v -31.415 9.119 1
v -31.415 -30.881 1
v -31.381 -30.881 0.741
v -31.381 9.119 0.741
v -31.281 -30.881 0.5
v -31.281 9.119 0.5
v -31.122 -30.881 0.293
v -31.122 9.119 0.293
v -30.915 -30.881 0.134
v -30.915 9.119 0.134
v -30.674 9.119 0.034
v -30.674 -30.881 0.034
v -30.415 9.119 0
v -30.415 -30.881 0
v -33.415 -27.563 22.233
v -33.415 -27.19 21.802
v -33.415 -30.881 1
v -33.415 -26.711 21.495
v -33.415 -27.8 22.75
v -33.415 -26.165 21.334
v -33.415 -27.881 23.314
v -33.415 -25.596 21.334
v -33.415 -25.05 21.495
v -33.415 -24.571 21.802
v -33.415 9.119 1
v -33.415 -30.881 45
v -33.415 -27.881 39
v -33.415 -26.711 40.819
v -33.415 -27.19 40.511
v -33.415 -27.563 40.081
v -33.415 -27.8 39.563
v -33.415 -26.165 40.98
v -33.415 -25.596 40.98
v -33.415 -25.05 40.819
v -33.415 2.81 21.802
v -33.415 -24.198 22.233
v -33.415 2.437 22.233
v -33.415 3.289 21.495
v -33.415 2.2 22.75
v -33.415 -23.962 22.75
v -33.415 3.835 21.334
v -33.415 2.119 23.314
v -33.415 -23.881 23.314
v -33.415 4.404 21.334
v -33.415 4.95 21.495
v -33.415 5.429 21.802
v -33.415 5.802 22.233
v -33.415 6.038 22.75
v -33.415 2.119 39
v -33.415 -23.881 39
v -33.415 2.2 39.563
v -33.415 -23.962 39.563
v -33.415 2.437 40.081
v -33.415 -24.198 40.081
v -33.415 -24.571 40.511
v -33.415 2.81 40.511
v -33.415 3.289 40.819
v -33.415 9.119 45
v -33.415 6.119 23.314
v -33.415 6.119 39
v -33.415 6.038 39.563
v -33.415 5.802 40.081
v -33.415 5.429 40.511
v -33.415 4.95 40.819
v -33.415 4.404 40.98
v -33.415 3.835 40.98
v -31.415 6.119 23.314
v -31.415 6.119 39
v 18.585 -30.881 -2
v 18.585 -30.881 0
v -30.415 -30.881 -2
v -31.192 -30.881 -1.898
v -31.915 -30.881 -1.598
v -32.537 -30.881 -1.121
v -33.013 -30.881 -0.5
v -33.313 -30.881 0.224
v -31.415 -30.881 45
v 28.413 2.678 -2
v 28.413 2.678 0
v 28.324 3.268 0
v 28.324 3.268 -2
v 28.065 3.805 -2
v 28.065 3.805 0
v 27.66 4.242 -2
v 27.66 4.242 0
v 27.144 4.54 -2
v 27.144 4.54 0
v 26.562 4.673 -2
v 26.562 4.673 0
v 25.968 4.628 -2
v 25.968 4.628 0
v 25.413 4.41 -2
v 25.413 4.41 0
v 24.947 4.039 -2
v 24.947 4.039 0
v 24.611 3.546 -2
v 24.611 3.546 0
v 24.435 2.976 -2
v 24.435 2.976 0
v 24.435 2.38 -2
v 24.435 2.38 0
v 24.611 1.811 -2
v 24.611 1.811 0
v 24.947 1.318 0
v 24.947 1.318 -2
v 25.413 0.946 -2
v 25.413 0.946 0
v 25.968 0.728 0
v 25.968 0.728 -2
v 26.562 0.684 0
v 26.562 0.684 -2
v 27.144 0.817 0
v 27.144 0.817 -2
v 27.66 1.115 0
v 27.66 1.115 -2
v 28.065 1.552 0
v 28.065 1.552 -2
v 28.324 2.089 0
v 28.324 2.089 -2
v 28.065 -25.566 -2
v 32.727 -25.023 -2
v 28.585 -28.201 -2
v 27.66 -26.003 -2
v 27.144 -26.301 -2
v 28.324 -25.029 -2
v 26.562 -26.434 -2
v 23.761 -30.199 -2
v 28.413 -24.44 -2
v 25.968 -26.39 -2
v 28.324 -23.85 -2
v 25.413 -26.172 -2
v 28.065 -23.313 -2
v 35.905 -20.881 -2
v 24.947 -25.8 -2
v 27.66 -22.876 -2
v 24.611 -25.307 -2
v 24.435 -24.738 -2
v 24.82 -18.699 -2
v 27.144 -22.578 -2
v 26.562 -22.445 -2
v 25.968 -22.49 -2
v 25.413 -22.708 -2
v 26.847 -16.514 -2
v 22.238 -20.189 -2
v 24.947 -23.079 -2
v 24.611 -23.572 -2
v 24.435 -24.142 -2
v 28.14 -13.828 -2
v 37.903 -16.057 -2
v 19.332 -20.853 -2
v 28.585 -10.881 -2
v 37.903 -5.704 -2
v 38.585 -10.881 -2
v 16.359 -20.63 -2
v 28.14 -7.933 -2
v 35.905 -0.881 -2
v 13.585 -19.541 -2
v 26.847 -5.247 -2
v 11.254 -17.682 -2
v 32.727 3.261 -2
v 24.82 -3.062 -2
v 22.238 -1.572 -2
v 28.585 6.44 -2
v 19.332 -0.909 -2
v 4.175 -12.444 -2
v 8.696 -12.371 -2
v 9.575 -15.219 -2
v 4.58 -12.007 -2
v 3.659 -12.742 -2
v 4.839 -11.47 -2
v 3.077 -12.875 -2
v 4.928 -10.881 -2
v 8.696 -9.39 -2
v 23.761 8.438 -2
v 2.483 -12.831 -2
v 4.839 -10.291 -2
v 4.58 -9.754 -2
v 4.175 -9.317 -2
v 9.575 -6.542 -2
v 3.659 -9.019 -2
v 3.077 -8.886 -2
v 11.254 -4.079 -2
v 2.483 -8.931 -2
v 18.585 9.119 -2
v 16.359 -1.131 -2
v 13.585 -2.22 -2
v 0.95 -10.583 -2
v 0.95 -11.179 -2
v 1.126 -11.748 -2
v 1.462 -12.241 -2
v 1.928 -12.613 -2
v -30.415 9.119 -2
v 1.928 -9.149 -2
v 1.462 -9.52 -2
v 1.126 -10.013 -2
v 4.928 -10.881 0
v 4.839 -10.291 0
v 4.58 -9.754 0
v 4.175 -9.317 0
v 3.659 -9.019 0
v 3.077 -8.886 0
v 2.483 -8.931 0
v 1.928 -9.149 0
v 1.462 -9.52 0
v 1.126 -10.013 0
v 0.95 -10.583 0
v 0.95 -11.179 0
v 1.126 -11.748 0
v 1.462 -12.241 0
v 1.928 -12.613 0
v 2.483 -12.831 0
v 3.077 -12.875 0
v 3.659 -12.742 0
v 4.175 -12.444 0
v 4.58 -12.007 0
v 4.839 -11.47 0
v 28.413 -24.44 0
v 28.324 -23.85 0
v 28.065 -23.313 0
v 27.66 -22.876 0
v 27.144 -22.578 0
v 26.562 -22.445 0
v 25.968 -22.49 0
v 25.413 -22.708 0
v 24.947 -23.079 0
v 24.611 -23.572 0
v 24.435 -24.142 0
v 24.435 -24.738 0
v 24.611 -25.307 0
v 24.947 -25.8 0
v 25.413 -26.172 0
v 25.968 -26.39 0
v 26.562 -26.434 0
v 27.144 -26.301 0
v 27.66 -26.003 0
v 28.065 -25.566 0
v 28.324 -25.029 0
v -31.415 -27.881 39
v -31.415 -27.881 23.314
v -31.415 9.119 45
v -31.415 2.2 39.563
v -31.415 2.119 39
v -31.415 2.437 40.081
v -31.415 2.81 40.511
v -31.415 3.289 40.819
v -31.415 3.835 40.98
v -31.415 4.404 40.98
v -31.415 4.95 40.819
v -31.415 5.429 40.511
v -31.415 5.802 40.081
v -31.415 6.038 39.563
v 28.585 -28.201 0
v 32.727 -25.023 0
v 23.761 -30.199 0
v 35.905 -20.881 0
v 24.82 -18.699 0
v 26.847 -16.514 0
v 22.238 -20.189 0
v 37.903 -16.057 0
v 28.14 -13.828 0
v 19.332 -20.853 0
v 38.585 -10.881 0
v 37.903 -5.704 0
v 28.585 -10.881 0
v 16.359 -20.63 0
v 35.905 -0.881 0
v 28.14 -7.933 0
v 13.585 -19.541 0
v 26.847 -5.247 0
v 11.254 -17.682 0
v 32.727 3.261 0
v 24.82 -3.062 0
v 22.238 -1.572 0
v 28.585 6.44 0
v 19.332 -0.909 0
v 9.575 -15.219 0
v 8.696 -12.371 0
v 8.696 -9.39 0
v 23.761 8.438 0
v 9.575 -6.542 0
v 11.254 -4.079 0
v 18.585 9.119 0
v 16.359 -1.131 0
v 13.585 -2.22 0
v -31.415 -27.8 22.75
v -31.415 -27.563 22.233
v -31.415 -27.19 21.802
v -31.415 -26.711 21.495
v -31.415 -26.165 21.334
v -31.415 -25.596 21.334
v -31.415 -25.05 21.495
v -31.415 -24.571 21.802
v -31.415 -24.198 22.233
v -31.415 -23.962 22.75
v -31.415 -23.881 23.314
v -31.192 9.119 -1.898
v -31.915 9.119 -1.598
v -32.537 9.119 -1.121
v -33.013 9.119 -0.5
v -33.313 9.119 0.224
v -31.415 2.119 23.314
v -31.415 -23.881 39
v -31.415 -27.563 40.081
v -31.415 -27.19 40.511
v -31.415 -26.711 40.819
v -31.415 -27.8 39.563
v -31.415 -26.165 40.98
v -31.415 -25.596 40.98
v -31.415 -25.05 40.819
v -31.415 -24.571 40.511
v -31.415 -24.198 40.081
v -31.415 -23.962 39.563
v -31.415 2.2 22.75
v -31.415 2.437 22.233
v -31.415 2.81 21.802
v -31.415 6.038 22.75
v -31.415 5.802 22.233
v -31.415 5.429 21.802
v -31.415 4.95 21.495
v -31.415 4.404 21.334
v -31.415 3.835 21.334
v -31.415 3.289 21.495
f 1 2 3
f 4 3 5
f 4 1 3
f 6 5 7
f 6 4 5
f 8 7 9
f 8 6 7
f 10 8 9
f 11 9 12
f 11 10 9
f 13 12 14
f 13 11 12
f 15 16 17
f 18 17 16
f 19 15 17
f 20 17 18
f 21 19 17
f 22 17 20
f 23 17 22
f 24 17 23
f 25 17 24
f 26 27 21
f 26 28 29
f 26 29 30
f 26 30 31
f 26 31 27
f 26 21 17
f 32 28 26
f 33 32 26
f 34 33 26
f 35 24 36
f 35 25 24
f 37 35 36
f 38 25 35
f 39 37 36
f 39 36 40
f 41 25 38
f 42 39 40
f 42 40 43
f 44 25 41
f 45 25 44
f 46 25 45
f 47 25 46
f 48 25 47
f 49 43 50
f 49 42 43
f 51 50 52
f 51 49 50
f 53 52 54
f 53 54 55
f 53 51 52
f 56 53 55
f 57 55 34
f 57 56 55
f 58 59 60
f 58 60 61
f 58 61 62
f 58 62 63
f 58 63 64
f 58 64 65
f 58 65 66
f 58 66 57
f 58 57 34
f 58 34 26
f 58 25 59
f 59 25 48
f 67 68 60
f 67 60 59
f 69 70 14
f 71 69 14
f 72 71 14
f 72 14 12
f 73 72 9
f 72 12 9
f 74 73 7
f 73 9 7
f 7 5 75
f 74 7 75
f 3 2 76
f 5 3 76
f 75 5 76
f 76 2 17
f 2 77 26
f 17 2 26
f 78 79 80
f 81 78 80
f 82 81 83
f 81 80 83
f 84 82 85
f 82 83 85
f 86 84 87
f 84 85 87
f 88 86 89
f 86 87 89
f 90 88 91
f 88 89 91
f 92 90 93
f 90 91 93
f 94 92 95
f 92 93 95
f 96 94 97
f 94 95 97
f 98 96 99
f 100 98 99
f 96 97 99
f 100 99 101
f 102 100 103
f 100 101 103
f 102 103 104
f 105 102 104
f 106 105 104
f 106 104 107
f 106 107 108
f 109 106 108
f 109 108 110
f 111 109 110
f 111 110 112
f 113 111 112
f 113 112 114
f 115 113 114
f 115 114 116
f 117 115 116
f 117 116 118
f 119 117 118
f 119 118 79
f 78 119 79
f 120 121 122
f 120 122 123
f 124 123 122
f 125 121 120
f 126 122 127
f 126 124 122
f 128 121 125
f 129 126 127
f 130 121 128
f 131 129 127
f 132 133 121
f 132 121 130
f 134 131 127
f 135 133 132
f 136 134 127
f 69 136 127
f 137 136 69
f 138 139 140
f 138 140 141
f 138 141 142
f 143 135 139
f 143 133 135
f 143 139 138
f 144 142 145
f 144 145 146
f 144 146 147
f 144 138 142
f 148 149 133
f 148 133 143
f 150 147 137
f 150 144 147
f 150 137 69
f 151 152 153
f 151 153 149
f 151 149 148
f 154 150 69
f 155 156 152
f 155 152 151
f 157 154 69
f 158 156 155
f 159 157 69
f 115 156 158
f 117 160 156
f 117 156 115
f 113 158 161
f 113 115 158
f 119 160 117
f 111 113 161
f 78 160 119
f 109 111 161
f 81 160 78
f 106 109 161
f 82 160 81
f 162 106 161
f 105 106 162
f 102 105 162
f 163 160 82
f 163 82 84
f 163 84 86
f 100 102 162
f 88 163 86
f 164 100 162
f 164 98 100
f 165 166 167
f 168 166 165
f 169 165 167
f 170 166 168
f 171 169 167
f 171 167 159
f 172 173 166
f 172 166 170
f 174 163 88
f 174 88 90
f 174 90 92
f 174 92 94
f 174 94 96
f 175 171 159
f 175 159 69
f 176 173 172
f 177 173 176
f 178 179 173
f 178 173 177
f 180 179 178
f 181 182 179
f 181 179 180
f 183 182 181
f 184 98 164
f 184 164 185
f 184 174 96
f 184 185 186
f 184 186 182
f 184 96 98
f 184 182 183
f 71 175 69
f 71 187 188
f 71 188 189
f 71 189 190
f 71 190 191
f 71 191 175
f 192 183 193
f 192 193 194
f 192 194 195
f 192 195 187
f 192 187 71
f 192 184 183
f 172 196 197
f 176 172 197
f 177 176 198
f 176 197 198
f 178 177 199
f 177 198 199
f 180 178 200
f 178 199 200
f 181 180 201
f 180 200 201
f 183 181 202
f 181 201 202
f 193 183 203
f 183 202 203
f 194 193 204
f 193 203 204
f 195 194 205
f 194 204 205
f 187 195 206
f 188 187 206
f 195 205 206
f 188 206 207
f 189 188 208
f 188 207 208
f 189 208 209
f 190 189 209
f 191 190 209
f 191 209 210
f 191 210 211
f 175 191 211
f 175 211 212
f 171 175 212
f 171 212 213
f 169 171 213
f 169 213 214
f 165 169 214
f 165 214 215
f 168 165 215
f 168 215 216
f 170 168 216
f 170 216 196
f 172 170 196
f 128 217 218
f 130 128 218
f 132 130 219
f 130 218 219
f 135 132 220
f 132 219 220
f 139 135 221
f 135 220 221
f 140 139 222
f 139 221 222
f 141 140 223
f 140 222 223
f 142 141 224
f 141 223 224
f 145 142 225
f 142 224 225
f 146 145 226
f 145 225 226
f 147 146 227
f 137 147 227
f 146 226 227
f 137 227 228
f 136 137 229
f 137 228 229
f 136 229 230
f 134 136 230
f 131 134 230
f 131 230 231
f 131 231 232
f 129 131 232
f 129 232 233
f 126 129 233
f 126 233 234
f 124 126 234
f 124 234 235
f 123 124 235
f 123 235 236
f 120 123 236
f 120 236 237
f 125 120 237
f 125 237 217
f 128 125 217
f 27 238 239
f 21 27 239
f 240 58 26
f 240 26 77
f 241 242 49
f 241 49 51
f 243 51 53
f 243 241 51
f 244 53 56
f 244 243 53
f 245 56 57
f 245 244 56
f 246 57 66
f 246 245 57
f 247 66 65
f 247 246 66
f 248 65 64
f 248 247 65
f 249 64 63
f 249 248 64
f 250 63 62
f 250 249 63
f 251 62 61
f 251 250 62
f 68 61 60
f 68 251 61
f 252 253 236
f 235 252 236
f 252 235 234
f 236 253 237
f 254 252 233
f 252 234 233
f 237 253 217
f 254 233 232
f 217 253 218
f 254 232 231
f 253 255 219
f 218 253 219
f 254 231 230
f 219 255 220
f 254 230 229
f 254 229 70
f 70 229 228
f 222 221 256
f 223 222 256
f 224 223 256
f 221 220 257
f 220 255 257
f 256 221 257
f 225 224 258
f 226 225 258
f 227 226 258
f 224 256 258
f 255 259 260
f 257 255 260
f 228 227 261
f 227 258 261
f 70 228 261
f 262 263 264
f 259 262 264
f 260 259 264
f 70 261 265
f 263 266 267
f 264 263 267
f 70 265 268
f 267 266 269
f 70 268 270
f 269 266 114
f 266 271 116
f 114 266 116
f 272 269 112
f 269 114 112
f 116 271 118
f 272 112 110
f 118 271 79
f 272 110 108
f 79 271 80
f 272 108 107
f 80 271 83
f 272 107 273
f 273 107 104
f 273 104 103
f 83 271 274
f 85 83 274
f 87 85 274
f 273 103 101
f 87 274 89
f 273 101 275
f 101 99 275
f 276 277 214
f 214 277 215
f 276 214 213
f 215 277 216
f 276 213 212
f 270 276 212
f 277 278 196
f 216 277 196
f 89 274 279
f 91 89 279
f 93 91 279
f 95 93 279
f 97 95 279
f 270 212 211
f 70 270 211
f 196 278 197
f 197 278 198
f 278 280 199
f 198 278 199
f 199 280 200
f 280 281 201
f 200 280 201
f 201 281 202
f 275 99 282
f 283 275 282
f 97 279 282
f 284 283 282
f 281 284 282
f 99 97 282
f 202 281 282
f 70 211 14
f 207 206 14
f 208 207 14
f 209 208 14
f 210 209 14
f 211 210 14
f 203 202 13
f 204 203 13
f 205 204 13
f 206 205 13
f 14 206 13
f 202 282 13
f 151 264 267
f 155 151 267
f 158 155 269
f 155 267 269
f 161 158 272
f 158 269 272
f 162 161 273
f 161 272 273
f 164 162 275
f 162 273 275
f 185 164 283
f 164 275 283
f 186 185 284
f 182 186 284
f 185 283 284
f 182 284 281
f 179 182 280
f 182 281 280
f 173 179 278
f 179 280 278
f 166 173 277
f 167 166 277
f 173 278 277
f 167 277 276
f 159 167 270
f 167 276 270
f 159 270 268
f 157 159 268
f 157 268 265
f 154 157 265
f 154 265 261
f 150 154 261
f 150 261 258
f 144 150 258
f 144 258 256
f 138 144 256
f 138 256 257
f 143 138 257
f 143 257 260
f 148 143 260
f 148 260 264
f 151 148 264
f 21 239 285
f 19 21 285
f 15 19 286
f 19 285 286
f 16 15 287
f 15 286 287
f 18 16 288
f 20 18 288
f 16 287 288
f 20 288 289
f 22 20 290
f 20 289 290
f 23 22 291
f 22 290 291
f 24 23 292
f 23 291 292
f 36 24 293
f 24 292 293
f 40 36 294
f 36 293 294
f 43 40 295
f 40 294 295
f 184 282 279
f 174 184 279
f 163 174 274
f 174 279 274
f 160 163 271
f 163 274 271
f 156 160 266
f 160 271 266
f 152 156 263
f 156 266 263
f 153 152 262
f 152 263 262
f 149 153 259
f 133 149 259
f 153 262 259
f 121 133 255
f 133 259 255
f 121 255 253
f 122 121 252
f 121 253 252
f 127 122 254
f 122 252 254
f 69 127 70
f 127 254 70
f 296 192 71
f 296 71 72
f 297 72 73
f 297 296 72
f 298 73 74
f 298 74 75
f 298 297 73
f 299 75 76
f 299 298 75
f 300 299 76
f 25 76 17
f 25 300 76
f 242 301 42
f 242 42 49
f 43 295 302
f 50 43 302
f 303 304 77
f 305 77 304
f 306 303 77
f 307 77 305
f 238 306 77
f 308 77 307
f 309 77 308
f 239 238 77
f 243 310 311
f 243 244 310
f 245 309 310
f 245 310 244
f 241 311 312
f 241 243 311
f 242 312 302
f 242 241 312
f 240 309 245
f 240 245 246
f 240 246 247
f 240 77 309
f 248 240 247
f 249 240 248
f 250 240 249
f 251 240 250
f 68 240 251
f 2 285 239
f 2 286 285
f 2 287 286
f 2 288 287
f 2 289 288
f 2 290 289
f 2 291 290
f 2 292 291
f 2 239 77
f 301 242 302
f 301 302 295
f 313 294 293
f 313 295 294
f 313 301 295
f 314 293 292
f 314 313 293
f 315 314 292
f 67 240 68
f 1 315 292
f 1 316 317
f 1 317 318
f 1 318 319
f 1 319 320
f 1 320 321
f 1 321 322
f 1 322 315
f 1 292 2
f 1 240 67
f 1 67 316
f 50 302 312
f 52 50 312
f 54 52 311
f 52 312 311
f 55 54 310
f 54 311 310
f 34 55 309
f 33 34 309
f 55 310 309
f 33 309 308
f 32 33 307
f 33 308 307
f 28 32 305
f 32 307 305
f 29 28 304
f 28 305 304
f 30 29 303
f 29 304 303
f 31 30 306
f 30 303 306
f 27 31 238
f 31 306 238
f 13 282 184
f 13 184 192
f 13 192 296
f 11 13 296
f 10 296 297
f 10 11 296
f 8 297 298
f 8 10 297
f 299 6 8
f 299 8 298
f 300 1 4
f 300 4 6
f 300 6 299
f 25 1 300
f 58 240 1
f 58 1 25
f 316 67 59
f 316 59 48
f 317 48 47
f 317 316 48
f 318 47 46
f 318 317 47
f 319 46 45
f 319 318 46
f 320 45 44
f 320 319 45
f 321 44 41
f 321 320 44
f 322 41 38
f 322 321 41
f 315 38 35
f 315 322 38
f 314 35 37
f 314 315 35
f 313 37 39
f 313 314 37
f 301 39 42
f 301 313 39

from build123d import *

# Parameters (mm, degrees)
SM_BASE_FLANGE_1_DEPTH           = 2
SKETCH_7_R                       = 10
SKETCH_7_R_2                     = 2
CUT_EXTRUDE_1_DEPTH              = 50.460967207
SM_EDGE_FLANGE_1_STRIP_W         = 10
SM_EDGE_FLANGE_1_STRIP_H         = 2
SM_EDGE_FLANGE_1_STRIP_CUT_DEPTH = 40
SM_EDGE_FLANGE_1_DEPTH           = 40
CUT_EXTRUDE_2_DEPTH              = 89.761563758


# Sheet-metal steps are written as plain solids
with BuildPart() as part:
    # Sketch 1 → 基体-法兰1 (new body)
    with BuildSketch(Plane.XY):
        with BuildLine():
            Line((-31.41539068, 9.119339374), (18.58460932, 9.119339374))
            ThreePointArc((18.58460932, 9.119339374), (38.58460932, -10.880660626), (18.58460932, -30.880660626))
            Line((18.58460932, -30.880660626), (-31.41539068, -30.880660626))
            Line((-31.41539068, -30.880660626), (-31.41539068, 9.119339374))
        make_face()
    extrude(amount=-SM_BASE_FLANGE_1_DEPTH)

    # 草图7 → 切除-拉伸1 (cut, through all)
    with BuildSketch(Plane.XY):
        with Locations((18.58460932, -10.880660626)):
            Circle(SKETCH_7_R)
        with Locations((2.928014356, -10.880660626)):
            Circle(SKETCH_7_R_2)
        with Locations((26.412906802, 2.67834835)):
            Circle(SKETCH_7_R_2)
        with Locations((26.412906802, -24.439669602)):
            Circle(SKETCH_7_R_2)
    extrude(amount=-CUT_EXTRUDE_1_DEPTH, mode=Mode.SUBTRACT)

    # 边线-法兰1 strip (across the edge) → 边线-法兰1 strip cut (cut)
    with BuildSketch(Plane(origin=(-31.41539068, 9.119339374, 0), x_dir=(1, 0, 0), z_dir=(0, -1, 0))):
        with Locations((-4, -1)):
            Rectangle(SM_EDGE_FLANGE_1_STRIP_W, SM_EDGE_FLANGE_1_STRIP_H)
    extrude(amount=SM_EDGE_FLANGE_1_STRIP_CUT_DEPTH, mode=Mode.SUBTRACT)

    # 边线-法兰1 section (across the edge) → 边线-法兰1 (add)
    with BuildSketch(Plane(origin=(-31.41539068, 9.119339374, 0), x_dir=(1, 0, 0), z_dir=(0, -1, 0))):
        with BuildLine():
            Line((-2, 1), (-2, 45))
            Line((-2, 45), (0, 45))
            Line((0, 45), (0, 1))
            ThreePointArc((0, 1), (0.292893219, 0.292893219), (1, 0))
            Line((1, 0), (1, -2))
            ThreePointArc((1, -2), (-1.121320344, -1.121320344), (-2, 1))
        make_face()
    extrude(amount=SM_EDGE_FLANGE_1_DEPTH)

    # 草图11 → 切除-拉伸2 (cut, through all)
    with BuildSketch(Plane(origin=(-31.41539068, 0, 0), x_dir=(0, 0, -1), z_dir=(1, 0, 0))):
        with BuildLine():
            Line((-39, 6.119339374), (-23.313924612, 6.119339374))
            ThreePointArc((-23.313924612, 6.119339374), (-21.313924612, 4.119339374), (-23.313924612, 2.119339374))
            Line((-23.313924612, 2.119339374), (-39, 2.119339374))
            ThreePointArc((-39, 2.119339374), (-41, 4.119339374), (-39, 6.119339374))
        make_face()
        with BuildLine():
            Line((-39, -27.880660626), (-23.313924612, -27.880660626))
            ThreePointArc((-23.313924612, -27.880660626), (-21.313924612, -25.880660626), (-23.313924612, -23.880660626))
            Line((-23.313924612, -23.880660626), (-39, -23.880660626))
            ThreePointArc((-39, -23.880660626), (-41, -25.880660626), (-39, -27.880660626))
        make_face()
    extrude(amount=-CUT_EXTRUDE_2_DEPTH, mode=Mode.SUBTRACT)


solid = part.part
